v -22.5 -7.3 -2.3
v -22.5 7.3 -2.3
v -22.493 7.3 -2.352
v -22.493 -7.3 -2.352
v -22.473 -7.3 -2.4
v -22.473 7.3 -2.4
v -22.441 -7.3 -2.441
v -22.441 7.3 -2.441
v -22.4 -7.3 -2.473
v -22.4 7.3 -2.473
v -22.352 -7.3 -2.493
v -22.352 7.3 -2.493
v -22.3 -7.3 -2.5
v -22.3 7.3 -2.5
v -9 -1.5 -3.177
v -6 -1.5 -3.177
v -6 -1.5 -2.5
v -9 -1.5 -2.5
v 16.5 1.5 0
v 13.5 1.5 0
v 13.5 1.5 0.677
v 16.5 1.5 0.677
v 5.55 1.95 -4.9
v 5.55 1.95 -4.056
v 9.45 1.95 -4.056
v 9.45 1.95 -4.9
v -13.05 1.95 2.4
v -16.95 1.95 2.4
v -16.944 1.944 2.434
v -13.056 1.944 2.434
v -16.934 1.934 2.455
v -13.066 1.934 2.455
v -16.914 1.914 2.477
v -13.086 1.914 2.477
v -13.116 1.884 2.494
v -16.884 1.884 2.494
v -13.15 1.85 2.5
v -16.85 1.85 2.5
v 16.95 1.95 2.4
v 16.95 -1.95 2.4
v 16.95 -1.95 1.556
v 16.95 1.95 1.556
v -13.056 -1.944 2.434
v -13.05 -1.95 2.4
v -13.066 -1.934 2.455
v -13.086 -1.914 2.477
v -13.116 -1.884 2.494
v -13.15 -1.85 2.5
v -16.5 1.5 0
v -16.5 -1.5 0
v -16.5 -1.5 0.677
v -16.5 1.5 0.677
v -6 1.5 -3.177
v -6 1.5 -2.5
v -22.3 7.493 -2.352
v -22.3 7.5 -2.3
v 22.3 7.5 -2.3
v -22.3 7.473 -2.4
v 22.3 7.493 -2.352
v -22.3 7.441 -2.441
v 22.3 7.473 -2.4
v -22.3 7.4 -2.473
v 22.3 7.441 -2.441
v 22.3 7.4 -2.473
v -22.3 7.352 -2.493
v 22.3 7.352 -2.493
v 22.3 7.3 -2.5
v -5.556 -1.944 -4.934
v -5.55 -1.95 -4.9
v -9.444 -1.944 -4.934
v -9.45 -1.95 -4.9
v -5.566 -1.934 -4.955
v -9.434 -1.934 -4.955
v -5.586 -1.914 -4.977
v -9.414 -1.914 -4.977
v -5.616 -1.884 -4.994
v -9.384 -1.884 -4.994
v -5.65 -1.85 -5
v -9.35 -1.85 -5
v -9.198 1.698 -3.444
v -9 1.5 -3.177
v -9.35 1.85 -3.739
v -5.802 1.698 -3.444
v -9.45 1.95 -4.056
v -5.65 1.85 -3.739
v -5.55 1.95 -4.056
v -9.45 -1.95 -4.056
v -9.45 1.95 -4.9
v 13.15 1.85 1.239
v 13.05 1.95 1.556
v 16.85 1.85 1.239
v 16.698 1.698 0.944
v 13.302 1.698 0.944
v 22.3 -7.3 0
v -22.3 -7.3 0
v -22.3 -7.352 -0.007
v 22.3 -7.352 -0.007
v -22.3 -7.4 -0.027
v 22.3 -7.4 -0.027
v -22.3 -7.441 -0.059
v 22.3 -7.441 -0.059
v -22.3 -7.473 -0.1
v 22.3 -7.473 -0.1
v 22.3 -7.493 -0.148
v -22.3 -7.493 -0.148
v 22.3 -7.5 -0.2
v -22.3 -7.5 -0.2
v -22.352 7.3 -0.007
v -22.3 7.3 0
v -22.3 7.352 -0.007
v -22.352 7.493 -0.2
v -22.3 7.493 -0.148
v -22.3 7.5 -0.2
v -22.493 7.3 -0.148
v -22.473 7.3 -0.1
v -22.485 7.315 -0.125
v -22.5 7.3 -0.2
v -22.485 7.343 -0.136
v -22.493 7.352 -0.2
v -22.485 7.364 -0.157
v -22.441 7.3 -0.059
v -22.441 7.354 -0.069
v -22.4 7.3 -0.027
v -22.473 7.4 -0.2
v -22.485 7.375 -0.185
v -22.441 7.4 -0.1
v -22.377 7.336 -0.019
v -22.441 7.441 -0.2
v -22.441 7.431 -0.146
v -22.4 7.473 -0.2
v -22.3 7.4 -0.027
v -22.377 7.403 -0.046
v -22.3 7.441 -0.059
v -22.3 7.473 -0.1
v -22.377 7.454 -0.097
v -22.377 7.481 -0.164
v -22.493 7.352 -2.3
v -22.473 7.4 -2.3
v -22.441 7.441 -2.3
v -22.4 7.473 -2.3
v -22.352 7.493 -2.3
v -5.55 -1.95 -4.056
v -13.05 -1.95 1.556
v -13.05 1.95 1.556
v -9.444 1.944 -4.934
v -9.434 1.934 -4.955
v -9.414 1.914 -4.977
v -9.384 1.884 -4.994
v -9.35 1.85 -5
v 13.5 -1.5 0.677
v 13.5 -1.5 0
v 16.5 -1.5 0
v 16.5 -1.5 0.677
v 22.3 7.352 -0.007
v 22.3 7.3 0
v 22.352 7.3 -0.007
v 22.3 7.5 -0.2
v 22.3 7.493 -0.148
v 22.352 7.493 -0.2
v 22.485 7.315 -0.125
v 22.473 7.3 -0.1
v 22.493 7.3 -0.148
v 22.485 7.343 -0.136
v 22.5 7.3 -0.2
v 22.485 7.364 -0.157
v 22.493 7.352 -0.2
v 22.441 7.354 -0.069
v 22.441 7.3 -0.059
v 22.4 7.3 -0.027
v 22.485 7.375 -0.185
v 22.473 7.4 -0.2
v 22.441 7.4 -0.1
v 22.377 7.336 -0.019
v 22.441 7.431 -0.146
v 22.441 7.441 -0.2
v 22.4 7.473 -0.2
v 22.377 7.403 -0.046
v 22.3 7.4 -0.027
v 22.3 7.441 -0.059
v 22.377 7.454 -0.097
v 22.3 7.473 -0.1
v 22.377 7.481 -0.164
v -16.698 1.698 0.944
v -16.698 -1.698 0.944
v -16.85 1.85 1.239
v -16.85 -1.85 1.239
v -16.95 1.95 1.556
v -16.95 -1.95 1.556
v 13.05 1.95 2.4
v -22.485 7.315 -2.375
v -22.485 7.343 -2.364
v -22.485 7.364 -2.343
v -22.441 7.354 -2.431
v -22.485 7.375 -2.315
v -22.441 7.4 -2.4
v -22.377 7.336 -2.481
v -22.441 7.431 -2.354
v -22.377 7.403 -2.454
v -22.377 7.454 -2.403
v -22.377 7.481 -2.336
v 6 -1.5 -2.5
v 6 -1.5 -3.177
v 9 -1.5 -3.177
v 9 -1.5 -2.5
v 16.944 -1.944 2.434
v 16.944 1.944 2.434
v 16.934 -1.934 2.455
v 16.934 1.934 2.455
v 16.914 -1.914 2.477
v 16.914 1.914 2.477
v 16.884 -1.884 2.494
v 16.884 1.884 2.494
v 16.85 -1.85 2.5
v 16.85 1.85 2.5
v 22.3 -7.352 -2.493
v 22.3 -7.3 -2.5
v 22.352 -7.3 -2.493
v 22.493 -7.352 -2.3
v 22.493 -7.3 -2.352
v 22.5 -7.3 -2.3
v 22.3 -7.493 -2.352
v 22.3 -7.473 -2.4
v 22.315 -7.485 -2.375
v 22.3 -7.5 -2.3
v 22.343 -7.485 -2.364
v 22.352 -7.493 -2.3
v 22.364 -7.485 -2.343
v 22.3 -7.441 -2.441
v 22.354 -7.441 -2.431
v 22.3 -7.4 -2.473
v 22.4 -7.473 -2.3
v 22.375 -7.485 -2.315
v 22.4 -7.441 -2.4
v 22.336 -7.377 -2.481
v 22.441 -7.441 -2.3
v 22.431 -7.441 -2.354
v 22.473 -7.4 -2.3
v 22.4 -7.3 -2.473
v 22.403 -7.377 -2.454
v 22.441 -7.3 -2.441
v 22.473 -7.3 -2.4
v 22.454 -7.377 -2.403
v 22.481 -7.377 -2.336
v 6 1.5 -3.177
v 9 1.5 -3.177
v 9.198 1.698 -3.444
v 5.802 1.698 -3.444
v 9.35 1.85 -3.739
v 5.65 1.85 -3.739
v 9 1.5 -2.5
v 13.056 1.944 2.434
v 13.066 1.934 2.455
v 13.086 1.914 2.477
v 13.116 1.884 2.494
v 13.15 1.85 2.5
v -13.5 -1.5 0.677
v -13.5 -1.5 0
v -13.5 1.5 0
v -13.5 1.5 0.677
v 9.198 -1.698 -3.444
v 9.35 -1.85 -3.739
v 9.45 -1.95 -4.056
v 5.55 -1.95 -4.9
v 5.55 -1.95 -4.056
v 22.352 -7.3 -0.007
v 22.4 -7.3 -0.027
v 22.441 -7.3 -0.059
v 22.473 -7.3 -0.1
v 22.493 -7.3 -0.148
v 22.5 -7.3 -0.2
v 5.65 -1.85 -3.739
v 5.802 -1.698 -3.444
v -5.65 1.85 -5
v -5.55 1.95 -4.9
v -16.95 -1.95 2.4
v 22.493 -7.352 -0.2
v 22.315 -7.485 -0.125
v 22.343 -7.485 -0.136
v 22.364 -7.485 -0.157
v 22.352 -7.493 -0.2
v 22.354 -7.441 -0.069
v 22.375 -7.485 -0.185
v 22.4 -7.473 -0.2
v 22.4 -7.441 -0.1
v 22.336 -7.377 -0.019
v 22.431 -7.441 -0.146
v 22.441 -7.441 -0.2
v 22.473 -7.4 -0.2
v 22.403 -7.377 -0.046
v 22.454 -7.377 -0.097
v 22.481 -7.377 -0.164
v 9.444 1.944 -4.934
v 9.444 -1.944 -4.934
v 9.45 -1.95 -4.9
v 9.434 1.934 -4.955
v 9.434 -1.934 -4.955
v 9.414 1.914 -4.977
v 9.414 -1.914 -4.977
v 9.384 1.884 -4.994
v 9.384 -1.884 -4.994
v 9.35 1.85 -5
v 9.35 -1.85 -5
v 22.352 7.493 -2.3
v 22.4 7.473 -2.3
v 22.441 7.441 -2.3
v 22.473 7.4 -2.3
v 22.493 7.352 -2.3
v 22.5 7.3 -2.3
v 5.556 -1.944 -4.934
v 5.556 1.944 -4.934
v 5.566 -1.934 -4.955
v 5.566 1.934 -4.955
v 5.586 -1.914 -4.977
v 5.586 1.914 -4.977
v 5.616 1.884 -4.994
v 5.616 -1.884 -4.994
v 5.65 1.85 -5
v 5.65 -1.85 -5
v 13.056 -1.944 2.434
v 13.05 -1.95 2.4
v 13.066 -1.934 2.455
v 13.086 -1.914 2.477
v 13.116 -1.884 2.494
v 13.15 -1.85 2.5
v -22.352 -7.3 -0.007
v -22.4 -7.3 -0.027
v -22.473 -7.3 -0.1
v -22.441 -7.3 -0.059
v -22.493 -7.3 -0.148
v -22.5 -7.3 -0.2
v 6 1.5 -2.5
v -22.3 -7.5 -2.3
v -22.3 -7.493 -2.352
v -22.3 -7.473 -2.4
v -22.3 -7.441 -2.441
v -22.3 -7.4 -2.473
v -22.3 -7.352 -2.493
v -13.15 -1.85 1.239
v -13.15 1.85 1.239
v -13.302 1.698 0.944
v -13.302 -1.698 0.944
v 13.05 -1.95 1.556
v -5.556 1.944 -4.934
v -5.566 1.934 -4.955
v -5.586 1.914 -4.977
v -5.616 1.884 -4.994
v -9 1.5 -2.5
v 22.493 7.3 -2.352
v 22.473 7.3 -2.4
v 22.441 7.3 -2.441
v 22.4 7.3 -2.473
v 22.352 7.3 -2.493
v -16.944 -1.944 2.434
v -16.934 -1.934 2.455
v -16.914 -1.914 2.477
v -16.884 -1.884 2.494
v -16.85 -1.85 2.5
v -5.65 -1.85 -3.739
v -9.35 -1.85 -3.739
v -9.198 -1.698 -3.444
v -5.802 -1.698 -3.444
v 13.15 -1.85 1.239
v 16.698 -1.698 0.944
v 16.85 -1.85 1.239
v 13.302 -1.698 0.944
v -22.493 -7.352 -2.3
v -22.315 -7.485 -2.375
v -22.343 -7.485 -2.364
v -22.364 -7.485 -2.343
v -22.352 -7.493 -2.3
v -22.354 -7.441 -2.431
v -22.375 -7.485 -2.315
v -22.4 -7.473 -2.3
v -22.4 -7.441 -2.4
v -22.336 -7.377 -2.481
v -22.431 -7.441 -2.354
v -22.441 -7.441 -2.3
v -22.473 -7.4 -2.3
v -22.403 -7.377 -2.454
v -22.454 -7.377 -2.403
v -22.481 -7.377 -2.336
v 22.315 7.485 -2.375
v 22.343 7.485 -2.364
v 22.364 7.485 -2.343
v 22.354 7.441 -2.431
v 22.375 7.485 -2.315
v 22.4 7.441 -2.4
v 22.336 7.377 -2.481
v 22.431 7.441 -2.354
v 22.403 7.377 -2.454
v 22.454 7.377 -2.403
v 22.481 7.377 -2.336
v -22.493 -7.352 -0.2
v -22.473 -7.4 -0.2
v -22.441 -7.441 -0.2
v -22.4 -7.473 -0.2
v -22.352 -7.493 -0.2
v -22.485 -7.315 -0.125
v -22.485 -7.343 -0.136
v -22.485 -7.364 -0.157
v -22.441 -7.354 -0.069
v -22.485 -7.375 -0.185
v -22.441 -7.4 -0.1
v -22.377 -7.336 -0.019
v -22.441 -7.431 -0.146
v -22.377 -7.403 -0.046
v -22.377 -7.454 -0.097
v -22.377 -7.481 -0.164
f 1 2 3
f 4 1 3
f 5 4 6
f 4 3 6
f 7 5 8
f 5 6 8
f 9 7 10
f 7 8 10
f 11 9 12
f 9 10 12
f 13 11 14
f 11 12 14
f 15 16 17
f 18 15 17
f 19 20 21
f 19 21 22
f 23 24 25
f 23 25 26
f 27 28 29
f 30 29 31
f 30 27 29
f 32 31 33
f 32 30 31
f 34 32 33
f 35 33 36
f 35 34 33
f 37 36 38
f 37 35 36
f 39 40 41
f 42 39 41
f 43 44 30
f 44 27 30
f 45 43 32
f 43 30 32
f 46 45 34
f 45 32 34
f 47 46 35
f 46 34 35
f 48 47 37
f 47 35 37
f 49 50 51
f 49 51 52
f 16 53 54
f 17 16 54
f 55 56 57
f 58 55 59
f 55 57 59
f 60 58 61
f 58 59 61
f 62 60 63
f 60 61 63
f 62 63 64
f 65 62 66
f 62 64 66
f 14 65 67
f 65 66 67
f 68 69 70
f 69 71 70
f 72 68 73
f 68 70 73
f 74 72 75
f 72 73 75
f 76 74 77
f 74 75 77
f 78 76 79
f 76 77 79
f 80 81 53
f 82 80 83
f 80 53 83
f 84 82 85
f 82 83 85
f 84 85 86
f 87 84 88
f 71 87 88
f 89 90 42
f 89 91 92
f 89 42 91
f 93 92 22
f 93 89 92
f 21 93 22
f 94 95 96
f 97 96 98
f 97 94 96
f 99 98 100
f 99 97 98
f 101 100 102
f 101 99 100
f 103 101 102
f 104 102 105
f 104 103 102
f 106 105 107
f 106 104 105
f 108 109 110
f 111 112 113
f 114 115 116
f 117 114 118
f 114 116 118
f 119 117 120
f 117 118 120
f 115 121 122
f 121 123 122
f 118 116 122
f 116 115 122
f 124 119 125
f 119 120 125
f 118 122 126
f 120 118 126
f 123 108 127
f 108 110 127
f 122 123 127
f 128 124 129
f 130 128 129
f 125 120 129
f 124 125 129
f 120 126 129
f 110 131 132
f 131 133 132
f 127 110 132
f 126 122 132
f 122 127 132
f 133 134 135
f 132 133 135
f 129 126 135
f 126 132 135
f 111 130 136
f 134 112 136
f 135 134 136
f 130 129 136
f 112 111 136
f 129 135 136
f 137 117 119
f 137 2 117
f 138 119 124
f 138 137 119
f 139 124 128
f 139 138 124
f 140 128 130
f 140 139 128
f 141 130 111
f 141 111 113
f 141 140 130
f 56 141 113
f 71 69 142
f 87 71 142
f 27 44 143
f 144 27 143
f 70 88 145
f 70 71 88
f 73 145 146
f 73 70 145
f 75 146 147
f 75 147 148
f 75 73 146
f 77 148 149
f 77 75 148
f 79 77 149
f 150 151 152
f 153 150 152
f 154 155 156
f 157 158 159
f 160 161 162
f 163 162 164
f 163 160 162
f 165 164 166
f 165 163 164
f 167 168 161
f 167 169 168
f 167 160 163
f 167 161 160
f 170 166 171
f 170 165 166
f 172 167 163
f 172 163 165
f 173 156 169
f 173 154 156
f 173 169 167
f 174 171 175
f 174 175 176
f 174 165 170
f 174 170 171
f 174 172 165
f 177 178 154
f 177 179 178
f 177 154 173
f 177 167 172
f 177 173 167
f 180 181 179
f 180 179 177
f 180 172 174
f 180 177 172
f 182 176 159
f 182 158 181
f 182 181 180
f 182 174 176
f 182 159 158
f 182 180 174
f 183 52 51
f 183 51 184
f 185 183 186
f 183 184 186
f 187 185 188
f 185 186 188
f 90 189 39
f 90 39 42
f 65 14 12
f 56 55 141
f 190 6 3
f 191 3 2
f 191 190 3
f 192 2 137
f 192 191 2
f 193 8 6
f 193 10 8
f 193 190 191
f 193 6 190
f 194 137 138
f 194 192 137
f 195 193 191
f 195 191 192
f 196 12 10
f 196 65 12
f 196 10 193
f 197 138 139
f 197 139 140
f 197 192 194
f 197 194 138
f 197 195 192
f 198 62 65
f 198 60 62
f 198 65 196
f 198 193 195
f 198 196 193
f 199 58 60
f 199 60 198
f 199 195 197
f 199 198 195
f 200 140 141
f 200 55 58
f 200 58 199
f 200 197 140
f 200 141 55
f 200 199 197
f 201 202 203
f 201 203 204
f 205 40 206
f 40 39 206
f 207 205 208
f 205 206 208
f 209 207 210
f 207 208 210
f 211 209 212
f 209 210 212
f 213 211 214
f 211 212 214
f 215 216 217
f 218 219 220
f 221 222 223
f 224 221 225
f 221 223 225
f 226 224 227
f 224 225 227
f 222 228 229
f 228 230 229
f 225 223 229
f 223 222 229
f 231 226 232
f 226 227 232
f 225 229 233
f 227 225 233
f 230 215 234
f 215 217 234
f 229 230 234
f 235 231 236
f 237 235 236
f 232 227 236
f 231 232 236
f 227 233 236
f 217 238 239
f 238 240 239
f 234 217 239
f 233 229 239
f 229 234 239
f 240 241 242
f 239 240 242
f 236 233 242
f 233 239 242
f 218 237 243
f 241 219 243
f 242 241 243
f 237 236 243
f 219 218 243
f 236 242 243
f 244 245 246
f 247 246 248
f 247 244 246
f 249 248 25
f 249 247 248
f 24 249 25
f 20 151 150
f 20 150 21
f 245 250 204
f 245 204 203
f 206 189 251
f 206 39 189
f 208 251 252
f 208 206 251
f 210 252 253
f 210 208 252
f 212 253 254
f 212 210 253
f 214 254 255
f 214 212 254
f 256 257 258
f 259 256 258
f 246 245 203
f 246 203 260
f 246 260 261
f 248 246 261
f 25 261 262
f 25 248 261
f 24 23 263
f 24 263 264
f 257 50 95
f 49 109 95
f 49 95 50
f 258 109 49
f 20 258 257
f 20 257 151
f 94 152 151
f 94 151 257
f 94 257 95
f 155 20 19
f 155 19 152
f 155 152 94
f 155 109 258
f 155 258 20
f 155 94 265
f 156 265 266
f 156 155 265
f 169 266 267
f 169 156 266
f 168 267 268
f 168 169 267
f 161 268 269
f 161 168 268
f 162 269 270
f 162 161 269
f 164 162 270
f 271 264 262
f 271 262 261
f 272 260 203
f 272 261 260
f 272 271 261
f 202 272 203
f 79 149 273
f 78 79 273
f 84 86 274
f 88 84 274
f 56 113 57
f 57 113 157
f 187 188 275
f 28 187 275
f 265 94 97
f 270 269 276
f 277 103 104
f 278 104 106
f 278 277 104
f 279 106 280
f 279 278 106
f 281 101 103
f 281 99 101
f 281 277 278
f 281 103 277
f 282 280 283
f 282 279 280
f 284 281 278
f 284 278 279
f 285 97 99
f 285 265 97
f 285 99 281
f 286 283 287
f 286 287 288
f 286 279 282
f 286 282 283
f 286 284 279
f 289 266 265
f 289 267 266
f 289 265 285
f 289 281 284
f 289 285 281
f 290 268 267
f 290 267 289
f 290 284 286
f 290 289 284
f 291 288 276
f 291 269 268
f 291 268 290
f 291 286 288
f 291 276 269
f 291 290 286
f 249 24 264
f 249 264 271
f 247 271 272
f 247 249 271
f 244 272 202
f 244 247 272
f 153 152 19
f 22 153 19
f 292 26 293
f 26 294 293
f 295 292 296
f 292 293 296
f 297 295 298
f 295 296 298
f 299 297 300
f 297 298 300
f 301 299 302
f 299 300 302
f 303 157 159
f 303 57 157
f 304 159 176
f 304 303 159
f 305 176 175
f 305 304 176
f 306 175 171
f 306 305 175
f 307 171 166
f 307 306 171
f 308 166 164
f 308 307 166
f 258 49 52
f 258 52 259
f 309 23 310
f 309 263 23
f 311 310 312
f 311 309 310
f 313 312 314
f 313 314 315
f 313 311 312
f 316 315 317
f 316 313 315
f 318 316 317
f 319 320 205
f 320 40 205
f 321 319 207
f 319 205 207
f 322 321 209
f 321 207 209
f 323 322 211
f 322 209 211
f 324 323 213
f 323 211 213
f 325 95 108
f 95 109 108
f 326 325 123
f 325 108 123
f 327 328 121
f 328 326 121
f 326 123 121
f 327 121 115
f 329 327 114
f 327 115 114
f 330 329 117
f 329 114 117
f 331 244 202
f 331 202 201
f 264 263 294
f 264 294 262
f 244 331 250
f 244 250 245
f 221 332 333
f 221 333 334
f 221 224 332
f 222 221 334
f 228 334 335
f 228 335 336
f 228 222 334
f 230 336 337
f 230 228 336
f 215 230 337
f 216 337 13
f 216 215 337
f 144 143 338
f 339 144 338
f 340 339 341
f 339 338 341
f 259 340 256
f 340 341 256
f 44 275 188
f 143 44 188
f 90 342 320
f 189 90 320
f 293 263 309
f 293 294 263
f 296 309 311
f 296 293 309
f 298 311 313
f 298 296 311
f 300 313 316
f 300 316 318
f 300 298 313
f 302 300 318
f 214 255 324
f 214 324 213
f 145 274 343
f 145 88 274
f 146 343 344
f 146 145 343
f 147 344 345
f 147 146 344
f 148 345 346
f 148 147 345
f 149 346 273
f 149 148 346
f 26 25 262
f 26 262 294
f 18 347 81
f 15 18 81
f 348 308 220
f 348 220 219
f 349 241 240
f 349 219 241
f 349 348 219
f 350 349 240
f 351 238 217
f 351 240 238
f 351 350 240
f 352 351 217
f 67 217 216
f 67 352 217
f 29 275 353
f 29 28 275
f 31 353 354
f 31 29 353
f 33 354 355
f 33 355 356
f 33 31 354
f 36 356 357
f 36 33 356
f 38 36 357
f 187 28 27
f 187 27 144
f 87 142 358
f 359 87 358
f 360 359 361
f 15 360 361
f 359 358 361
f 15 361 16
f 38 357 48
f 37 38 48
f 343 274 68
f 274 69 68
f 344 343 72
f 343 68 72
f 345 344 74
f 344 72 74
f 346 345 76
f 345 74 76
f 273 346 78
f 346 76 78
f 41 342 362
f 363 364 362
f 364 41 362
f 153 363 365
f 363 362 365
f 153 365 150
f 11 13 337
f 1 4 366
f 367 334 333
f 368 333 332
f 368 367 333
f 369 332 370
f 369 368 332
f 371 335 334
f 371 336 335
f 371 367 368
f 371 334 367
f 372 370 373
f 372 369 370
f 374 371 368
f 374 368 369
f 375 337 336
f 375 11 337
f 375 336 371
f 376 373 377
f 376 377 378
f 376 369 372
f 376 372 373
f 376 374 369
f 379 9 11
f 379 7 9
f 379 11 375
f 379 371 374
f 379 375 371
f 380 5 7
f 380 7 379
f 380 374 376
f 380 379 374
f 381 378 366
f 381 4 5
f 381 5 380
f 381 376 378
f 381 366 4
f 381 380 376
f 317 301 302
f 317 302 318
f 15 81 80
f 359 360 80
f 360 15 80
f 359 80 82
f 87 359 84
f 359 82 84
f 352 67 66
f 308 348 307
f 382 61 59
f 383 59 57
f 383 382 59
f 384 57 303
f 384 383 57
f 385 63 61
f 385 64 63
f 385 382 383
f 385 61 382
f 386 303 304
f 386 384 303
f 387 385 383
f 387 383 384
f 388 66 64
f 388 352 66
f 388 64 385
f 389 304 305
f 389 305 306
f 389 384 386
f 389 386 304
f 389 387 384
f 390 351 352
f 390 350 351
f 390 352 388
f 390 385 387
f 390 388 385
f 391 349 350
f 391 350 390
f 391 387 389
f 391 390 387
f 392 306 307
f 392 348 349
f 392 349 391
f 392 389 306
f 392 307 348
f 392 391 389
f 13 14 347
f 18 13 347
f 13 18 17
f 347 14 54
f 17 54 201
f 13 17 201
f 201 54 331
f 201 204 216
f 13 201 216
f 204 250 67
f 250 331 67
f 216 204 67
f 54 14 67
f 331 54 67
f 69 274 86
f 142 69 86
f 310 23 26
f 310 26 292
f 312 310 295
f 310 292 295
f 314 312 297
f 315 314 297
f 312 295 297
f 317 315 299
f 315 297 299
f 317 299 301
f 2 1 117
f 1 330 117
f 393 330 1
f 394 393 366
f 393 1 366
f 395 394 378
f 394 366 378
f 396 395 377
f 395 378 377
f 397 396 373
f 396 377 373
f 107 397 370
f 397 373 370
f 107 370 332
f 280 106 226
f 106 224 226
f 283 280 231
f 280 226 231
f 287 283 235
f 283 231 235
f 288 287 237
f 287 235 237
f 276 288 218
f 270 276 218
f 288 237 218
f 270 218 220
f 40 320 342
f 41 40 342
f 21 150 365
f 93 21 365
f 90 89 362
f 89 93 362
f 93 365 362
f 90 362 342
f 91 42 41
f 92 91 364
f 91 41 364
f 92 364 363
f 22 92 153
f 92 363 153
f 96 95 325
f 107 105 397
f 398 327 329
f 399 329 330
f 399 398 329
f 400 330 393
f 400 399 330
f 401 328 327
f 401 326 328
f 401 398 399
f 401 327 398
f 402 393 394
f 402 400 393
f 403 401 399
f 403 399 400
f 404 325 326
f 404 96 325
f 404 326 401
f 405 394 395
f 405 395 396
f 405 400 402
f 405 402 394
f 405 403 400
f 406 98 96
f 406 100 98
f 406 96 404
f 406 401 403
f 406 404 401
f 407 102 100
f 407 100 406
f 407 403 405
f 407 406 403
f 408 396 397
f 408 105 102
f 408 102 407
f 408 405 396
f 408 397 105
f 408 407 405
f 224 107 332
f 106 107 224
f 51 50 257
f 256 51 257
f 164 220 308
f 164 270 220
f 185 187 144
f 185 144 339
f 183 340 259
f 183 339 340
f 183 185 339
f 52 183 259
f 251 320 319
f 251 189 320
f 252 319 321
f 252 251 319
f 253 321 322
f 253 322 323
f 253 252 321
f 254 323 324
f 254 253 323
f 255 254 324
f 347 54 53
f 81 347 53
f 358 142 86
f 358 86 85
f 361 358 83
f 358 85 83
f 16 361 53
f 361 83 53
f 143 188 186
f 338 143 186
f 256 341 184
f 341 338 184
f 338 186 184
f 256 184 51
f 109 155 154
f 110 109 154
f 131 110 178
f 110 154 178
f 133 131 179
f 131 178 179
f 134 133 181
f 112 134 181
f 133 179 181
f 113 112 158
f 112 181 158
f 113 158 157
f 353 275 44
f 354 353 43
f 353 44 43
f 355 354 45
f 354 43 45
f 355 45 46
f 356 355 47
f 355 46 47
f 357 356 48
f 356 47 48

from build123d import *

# Parameters (mm, degrees)
SKETCH_1_W           = 45
SKETCH_1_H           = 15
EXTRUDE_1_DEPTH      = 2.5
SKETCH_2_W           = 3
SKETCH_2_H           = 3
EXTRUDE_2_DEPTH      = 1
EXTRUDE_3_DEPTH      = 2
EXTRUDE_3_DEPTH_BACK = 2
CUT_EXTRUDE_1_DEPTH  = 41.234344782
FILLET_1_R           = 0.2
FILLET_2_R           = 0.1
EXTRUDE_4_DEPTH      = 2
CUT_EXTRUDE_2_DEPTH  = 10
FILLET_3_R           = 0.1


with BuildPart() as part:
    # 草图1 → 凸台-拉伸1 (new body)
    with BuildSketch(Plane.XY):
        Rectangle(SKETCH_1_W, SKETCH_1_H)
    extrude(amount=-EXTRUDE_1_DEPTH)

    # 草图2 → 凸台-拉伸2 (add)
    with BuildSketch(Plane.XY):
        with Locations((-15, 0)):
            Rectangle(SKETCH_2_W, SKETCH_2_H)
        with Locations((15, 0)):
            Rectangle(SKETCH_2_W, SKETCH_2_H)
    extrude(amount=EXTRUDE_2_DEPTH)

    # 草图3 → 凸台-拉伸3 (add, two sides: drawn at the far end of the back side and taken through both)
    with BuildSketch(Plane(origin=(0, 0, 0), x_dir=(1, 0, 0), z_dir=(0, 1, 0)).offset(-EXTRUDE_3_DEPTH_BACK)):
        with BuildLine():
            Line((-16.95, -2.5), (-13.05, -2.5))
            Line((-13.05, -2.5), (-13.05, -1.555590279))
            ThreePointArc((-13.05, -1.555590279), (-13.219957697, -1.088161527), (-13.5, -0.677124344))
            Line((-13.5, -0.677124344), (-16.5, -0.677124344))
            ThreePointArc((-16.5, -0.677124344), (-16.780042303, -1.088161527), (-16.95, -1.555590279))
            Line((-16.95, -1.555590279), (-16.95, -2.5))
        make_face()
        with BuildLine():
            Line((16.5, -0.677124344), (13.5, -0.677124344))
            ThreePointArc((13.5, -0.677124344), (13.219957697, -1.088161527), (13.05, -1.555590279))
            Line((13.05, -1.555590279), (13.05, -2.5))
            Line((13.05, -2.5), (16.95, -2.5))
            Line((16.95, -2.5), (16.95, -1.555590279))
            ThreePointArc((16.95, -1.555590279), (16.780042303, -1.088161527), (16.5, -0.677124344))
        make_face()
    extrude(amount=EXTRUDE_3_DEPTH + EXTRUDE_3_DEPTH_BACK)

    # 草图4 → 切除-拉伸1 (cut, through all)
    with BuildSketch(Plane.ZY.offset(16.95)):
        with BuildLine():
            Line((2.5, 1.95), (1.555590279, 1.95))
            ThreePointArc((1.555590279, 1.95), (1.088161527, 1.780042303), (0.677124344, 1.5))
            Line((0.677124344, 1.5), (0.677124344, 2))
            Line((0.677124344, 2), (2.5, 2))
            Line((2.5, 2), (2.5, 1.95))
        make_face()
        with BuildLine():
            Line((0.677124344, -2), (2.5, -2))
            Line((2.5, -2), (2.5, -1.95))
            Line((2.5, -1.95), (1.555590279, -1.95))
            ThreePointArc((1.555590279, -1.95), (1.088161527, -1.780042303), (0.677124344, -1.5))
            Line((0.677124344, -1.5), (0.677124344, -2))
        make_face()
    extrude(amount=-CUT_EXTRUDE_1_DEPTH, mode=Mode.SUBTRACT)

    # 圆角1
    fillet_1_edges = [part.edges().sort_by_distance(p)[0] for p in [
        (22.5, 0, -2.5),
        (0, 7.5, -2.5),
        (-22.5, 0, -2.5),
        (0, 7.5, 0),
        (22.5, 0, 0),
        (0, -7.5, 0),
        (-22.5, 0, 0),
        (0, -7.5, -2.5),
        (-22.5, 7.5, -1.25),
        (22.5, 7.5, -1.25),
        (22.5, -7.5, -1.25),
        (-22.5, -7.5, -1.25),
    ]]
    fillet(fillet_1_edges, radius=FILLET_1_R)

    # 圆角2
    fillet_2_edges = [part.edges().sort_by_distance(p)[0] for p in [
        (13.05, 0, 2.5),
        (16.95, 0, 2.5),
        (-16.95, 0, 2.5),
        (-13.05, 0, 2.5),
        (-15, -1.95, 2.5),
        (15, -1.95, 2.5),
        (-15, 1.95, 2.5),
        (15, 1.95, 2.5),
    ]]
    fillet(fillet_2_edges, radius=FILLET_2_R)

    # 草图6 → 凸台-拉伸4 (add, symmetric)
    with BuildSketch(Plane(origin=(0, 0, 0), x_dir=(1, 0, 0), z_dir=(0, 1, 0))):
        with BuildLine():
            Line((-6, 2.5), (-9, 2.5))
            Line((-9, 2.5), (-9, 3.177124344))
            ThreePointArc((-9, 3.177124344), (-9.280042303, 3.588161527), (-9.45, 4.055590279))
            Line((-9.45, 4.055590279), (-9.45, 5))
            Line((-9.45, 5), (-5.55, 5))
            Line((-5.55, 5), (-5.55, 4.055590279))
            ThreePointArc((-5.55, 4.055590279), (-5.719957697, 3.588161527), (-6, 3.177124344))
            Line((-6, 3.177124344), (-6, 2.5))
        make_face()
    extrude_4 = extrude(amount=EXTRUDE_4_DEPTH, both=True)

    # 草图7 → 切除-拉伸2 (cut)
    with BuildSketch(Plane(origin=(0, 0, 0), x_dir=(0, 0, -1), z_dir=(1, 0, 0))):
        with BuildLine():
            Line((2.5, 1.5), (3.177124344, 1.5))
            ThreePointArc((3.177124344, 1.5), (3.588161527, 1.780042303), (4.055590279, 1.95))
            Line((4.055590279, 1.95), (5, 1.95))
            Line((5, 1.95), (5, 2))
            Line((5, 2), (2.5, 2))
            Line((2.5, 2), (2.5, 1.5))
        make_face()
        with BuildLine():
            Line((5, -1.95), (4.055590279, -1.95))
            ThreePointArc((4.055590279, -1.95), (3.588161527, -1.780042303), (3.177124344, -1.5))
            Line((3.177124344, -1.5), (2.5, -1.5))
            Line((2.5, -1.5), (2.5, -2))
            Line((2.5, -2), (5, -2))
            Line((5, -2), (5, -1.95))
        make_face()
    cut_extrude_2 = extrude(amount=-CUT_EXTRUDE_2_DEPTH, mode=Mode.SUBTRACT)

    # 镜向1: 凸台-拉伸4, 切除-拉伸2 across plane
    add(extrude_4.mirror(Plane(origin=(0, 0, 0), x_dir=(0, 0, 1), z_dir=(1, 0, 0))))
    add(cut_extrude_2.mirror(Plane(origin=(0, 0, 0), x_dir=(0, 0, 1), z_dir=(1, 0, 0))), mode=Mode.SUBTRACT)

    # 圆角3
    fillet_3_edges = [part.edges().sort_by_distance(p)[0] for p in [
        (-5.55, 0, -5),
        (-9.45, 0, -5),
        (-7.5, -1.95, -5),
        (-7.5, 1.95, -5),
        (9.45, 0, -5),
        (5.55, 0, -5),
        (7.5, -1.95, -5),
        (7.5, 1.95, -5),
    ]]
    fillet(fillet_3_edges, radius=FILLET_3_R)


solid = part.part
